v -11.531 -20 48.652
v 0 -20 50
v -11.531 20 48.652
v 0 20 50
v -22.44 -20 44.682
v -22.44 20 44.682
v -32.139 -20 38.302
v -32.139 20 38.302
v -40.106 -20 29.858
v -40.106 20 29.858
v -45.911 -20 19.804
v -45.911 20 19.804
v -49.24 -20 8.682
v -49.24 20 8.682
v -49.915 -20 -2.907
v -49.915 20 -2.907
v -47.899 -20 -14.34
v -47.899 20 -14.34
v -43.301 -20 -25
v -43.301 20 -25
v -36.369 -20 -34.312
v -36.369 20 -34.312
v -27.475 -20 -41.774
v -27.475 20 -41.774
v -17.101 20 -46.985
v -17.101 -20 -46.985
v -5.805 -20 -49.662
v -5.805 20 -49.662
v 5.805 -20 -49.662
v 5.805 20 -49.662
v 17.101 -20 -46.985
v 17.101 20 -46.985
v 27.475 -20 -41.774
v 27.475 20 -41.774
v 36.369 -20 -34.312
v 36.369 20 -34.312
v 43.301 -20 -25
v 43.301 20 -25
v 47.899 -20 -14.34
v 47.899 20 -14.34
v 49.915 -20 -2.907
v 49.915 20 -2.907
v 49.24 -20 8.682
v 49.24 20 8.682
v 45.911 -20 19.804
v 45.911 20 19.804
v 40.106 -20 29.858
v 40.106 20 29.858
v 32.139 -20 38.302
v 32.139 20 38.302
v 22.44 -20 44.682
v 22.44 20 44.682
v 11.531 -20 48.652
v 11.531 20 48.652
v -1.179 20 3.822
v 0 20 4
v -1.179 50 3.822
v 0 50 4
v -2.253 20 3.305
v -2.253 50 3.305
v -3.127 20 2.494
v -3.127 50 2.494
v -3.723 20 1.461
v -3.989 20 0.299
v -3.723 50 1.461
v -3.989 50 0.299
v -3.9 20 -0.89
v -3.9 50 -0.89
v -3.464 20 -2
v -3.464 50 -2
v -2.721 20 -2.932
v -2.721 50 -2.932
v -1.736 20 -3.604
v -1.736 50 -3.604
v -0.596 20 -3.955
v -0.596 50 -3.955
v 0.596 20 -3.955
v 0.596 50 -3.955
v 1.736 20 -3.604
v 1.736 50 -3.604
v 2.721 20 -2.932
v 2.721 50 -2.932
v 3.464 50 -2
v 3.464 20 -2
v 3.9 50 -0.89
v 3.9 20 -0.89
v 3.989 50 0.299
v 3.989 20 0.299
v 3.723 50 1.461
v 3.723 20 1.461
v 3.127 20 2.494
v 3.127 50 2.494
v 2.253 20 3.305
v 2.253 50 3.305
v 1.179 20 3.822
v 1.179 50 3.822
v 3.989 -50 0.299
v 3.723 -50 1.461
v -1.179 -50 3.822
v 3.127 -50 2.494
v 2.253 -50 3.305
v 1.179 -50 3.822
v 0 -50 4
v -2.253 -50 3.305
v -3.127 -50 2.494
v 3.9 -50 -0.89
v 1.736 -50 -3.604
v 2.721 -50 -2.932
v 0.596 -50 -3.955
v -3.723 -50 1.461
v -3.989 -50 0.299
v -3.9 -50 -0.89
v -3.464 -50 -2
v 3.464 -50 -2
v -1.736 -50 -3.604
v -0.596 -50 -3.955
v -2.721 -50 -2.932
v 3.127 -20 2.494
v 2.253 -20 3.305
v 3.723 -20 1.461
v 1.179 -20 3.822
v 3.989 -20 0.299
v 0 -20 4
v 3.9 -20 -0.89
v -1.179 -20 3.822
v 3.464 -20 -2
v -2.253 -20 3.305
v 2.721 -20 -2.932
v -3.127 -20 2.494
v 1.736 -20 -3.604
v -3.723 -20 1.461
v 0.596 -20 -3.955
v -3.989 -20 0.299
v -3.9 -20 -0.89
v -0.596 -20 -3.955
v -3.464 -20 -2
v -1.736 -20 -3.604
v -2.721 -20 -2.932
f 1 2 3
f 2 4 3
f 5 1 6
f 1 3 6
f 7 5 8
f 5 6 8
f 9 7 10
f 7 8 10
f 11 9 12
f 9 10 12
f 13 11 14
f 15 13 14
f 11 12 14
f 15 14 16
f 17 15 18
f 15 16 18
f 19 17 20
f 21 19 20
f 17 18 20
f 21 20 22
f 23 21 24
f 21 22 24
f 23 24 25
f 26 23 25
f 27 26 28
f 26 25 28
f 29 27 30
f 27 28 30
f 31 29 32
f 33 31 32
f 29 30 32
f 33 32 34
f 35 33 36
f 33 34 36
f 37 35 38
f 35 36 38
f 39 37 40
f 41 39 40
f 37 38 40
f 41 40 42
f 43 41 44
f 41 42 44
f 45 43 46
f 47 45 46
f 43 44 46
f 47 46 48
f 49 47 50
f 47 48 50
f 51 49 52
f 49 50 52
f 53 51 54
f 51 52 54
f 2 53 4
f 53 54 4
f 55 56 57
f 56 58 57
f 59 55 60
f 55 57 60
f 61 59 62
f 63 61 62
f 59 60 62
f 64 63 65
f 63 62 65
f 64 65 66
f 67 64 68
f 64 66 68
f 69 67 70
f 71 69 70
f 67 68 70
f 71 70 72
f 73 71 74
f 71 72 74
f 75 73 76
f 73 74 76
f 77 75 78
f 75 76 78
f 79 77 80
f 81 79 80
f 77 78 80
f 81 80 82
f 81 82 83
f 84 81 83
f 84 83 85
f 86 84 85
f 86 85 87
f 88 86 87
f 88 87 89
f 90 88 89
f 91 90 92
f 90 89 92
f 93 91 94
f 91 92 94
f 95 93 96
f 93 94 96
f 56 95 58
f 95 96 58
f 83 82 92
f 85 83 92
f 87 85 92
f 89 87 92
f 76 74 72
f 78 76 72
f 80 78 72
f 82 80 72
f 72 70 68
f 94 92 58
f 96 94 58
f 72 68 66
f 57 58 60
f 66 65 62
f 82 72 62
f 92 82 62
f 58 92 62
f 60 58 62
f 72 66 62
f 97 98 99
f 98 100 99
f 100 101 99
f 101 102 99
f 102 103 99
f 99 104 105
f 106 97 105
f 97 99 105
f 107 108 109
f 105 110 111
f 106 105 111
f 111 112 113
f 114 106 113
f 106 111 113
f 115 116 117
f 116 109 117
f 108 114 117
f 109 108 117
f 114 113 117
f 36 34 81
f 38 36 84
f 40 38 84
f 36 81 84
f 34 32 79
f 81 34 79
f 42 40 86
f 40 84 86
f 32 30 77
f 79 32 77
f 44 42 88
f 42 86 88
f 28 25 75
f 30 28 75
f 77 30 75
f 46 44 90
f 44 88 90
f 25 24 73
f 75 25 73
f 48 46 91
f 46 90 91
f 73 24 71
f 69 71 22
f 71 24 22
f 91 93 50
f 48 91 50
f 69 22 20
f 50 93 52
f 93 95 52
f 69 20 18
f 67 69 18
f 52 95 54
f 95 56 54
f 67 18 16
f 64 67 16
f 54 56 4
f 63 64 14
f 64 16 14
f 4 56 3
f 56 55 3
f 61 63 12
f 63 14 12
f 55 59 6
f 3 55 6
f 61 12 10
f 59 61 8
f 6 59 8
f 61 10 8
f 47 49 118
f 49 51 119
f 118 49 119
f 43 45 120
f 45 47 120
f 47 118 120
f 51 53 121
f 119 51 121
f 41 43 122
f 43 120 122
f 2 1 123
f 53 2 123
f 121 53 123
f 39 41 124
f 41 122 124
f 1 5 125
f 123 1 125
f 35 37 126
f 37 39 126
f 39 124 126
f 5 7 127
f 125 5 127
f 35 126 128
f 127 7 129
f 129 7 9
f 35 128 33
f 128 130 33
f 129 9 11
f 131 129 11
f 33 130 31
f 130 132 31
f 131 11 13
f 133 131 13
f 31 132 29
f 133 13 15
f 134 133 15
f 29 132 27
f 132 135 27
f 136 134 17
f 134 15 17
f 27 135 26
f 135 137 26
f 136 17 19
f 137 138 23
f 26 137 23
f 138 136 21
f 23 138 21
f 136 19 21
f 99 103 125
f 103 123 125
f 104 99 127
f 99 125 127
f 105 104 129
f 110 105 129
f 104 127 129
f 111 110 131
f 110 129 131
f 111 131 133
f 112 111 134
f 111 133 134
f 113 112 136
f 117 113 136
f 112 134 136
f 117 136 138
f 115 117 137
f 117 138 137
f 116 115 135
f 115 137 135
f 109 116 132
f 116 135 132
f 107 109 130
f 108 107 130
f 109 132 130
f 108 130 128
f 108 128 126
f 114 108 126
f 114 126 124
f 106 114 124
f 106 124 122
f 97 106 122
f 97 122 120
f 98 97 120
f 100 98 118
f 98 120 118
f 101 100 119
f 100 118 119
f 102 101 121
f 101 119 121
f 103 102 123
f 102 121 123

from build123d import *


with BuildPart() as part:
    # Sketch1 → Revolve3 (revolve)
    with BuildSketch(Plane.XY, mode=Mode.PRIVATE) as revolve3_sk:
        Polygon((0, 50), (0, 0), (50, 0), (50, 20), (4, 20), (4, 50), align=None)
        Polygon((50, 0), (0, 0), (0, -50), (4, -50), (4, -20), (50, -20), align=None)
    revolve(revolve3_sk.sketch.rotate(Axis((0, 50, 0), (0, -1, 0)), 90), axis=Axis((0, 50, 0), (0, -1, 0)))


solid = part.part
